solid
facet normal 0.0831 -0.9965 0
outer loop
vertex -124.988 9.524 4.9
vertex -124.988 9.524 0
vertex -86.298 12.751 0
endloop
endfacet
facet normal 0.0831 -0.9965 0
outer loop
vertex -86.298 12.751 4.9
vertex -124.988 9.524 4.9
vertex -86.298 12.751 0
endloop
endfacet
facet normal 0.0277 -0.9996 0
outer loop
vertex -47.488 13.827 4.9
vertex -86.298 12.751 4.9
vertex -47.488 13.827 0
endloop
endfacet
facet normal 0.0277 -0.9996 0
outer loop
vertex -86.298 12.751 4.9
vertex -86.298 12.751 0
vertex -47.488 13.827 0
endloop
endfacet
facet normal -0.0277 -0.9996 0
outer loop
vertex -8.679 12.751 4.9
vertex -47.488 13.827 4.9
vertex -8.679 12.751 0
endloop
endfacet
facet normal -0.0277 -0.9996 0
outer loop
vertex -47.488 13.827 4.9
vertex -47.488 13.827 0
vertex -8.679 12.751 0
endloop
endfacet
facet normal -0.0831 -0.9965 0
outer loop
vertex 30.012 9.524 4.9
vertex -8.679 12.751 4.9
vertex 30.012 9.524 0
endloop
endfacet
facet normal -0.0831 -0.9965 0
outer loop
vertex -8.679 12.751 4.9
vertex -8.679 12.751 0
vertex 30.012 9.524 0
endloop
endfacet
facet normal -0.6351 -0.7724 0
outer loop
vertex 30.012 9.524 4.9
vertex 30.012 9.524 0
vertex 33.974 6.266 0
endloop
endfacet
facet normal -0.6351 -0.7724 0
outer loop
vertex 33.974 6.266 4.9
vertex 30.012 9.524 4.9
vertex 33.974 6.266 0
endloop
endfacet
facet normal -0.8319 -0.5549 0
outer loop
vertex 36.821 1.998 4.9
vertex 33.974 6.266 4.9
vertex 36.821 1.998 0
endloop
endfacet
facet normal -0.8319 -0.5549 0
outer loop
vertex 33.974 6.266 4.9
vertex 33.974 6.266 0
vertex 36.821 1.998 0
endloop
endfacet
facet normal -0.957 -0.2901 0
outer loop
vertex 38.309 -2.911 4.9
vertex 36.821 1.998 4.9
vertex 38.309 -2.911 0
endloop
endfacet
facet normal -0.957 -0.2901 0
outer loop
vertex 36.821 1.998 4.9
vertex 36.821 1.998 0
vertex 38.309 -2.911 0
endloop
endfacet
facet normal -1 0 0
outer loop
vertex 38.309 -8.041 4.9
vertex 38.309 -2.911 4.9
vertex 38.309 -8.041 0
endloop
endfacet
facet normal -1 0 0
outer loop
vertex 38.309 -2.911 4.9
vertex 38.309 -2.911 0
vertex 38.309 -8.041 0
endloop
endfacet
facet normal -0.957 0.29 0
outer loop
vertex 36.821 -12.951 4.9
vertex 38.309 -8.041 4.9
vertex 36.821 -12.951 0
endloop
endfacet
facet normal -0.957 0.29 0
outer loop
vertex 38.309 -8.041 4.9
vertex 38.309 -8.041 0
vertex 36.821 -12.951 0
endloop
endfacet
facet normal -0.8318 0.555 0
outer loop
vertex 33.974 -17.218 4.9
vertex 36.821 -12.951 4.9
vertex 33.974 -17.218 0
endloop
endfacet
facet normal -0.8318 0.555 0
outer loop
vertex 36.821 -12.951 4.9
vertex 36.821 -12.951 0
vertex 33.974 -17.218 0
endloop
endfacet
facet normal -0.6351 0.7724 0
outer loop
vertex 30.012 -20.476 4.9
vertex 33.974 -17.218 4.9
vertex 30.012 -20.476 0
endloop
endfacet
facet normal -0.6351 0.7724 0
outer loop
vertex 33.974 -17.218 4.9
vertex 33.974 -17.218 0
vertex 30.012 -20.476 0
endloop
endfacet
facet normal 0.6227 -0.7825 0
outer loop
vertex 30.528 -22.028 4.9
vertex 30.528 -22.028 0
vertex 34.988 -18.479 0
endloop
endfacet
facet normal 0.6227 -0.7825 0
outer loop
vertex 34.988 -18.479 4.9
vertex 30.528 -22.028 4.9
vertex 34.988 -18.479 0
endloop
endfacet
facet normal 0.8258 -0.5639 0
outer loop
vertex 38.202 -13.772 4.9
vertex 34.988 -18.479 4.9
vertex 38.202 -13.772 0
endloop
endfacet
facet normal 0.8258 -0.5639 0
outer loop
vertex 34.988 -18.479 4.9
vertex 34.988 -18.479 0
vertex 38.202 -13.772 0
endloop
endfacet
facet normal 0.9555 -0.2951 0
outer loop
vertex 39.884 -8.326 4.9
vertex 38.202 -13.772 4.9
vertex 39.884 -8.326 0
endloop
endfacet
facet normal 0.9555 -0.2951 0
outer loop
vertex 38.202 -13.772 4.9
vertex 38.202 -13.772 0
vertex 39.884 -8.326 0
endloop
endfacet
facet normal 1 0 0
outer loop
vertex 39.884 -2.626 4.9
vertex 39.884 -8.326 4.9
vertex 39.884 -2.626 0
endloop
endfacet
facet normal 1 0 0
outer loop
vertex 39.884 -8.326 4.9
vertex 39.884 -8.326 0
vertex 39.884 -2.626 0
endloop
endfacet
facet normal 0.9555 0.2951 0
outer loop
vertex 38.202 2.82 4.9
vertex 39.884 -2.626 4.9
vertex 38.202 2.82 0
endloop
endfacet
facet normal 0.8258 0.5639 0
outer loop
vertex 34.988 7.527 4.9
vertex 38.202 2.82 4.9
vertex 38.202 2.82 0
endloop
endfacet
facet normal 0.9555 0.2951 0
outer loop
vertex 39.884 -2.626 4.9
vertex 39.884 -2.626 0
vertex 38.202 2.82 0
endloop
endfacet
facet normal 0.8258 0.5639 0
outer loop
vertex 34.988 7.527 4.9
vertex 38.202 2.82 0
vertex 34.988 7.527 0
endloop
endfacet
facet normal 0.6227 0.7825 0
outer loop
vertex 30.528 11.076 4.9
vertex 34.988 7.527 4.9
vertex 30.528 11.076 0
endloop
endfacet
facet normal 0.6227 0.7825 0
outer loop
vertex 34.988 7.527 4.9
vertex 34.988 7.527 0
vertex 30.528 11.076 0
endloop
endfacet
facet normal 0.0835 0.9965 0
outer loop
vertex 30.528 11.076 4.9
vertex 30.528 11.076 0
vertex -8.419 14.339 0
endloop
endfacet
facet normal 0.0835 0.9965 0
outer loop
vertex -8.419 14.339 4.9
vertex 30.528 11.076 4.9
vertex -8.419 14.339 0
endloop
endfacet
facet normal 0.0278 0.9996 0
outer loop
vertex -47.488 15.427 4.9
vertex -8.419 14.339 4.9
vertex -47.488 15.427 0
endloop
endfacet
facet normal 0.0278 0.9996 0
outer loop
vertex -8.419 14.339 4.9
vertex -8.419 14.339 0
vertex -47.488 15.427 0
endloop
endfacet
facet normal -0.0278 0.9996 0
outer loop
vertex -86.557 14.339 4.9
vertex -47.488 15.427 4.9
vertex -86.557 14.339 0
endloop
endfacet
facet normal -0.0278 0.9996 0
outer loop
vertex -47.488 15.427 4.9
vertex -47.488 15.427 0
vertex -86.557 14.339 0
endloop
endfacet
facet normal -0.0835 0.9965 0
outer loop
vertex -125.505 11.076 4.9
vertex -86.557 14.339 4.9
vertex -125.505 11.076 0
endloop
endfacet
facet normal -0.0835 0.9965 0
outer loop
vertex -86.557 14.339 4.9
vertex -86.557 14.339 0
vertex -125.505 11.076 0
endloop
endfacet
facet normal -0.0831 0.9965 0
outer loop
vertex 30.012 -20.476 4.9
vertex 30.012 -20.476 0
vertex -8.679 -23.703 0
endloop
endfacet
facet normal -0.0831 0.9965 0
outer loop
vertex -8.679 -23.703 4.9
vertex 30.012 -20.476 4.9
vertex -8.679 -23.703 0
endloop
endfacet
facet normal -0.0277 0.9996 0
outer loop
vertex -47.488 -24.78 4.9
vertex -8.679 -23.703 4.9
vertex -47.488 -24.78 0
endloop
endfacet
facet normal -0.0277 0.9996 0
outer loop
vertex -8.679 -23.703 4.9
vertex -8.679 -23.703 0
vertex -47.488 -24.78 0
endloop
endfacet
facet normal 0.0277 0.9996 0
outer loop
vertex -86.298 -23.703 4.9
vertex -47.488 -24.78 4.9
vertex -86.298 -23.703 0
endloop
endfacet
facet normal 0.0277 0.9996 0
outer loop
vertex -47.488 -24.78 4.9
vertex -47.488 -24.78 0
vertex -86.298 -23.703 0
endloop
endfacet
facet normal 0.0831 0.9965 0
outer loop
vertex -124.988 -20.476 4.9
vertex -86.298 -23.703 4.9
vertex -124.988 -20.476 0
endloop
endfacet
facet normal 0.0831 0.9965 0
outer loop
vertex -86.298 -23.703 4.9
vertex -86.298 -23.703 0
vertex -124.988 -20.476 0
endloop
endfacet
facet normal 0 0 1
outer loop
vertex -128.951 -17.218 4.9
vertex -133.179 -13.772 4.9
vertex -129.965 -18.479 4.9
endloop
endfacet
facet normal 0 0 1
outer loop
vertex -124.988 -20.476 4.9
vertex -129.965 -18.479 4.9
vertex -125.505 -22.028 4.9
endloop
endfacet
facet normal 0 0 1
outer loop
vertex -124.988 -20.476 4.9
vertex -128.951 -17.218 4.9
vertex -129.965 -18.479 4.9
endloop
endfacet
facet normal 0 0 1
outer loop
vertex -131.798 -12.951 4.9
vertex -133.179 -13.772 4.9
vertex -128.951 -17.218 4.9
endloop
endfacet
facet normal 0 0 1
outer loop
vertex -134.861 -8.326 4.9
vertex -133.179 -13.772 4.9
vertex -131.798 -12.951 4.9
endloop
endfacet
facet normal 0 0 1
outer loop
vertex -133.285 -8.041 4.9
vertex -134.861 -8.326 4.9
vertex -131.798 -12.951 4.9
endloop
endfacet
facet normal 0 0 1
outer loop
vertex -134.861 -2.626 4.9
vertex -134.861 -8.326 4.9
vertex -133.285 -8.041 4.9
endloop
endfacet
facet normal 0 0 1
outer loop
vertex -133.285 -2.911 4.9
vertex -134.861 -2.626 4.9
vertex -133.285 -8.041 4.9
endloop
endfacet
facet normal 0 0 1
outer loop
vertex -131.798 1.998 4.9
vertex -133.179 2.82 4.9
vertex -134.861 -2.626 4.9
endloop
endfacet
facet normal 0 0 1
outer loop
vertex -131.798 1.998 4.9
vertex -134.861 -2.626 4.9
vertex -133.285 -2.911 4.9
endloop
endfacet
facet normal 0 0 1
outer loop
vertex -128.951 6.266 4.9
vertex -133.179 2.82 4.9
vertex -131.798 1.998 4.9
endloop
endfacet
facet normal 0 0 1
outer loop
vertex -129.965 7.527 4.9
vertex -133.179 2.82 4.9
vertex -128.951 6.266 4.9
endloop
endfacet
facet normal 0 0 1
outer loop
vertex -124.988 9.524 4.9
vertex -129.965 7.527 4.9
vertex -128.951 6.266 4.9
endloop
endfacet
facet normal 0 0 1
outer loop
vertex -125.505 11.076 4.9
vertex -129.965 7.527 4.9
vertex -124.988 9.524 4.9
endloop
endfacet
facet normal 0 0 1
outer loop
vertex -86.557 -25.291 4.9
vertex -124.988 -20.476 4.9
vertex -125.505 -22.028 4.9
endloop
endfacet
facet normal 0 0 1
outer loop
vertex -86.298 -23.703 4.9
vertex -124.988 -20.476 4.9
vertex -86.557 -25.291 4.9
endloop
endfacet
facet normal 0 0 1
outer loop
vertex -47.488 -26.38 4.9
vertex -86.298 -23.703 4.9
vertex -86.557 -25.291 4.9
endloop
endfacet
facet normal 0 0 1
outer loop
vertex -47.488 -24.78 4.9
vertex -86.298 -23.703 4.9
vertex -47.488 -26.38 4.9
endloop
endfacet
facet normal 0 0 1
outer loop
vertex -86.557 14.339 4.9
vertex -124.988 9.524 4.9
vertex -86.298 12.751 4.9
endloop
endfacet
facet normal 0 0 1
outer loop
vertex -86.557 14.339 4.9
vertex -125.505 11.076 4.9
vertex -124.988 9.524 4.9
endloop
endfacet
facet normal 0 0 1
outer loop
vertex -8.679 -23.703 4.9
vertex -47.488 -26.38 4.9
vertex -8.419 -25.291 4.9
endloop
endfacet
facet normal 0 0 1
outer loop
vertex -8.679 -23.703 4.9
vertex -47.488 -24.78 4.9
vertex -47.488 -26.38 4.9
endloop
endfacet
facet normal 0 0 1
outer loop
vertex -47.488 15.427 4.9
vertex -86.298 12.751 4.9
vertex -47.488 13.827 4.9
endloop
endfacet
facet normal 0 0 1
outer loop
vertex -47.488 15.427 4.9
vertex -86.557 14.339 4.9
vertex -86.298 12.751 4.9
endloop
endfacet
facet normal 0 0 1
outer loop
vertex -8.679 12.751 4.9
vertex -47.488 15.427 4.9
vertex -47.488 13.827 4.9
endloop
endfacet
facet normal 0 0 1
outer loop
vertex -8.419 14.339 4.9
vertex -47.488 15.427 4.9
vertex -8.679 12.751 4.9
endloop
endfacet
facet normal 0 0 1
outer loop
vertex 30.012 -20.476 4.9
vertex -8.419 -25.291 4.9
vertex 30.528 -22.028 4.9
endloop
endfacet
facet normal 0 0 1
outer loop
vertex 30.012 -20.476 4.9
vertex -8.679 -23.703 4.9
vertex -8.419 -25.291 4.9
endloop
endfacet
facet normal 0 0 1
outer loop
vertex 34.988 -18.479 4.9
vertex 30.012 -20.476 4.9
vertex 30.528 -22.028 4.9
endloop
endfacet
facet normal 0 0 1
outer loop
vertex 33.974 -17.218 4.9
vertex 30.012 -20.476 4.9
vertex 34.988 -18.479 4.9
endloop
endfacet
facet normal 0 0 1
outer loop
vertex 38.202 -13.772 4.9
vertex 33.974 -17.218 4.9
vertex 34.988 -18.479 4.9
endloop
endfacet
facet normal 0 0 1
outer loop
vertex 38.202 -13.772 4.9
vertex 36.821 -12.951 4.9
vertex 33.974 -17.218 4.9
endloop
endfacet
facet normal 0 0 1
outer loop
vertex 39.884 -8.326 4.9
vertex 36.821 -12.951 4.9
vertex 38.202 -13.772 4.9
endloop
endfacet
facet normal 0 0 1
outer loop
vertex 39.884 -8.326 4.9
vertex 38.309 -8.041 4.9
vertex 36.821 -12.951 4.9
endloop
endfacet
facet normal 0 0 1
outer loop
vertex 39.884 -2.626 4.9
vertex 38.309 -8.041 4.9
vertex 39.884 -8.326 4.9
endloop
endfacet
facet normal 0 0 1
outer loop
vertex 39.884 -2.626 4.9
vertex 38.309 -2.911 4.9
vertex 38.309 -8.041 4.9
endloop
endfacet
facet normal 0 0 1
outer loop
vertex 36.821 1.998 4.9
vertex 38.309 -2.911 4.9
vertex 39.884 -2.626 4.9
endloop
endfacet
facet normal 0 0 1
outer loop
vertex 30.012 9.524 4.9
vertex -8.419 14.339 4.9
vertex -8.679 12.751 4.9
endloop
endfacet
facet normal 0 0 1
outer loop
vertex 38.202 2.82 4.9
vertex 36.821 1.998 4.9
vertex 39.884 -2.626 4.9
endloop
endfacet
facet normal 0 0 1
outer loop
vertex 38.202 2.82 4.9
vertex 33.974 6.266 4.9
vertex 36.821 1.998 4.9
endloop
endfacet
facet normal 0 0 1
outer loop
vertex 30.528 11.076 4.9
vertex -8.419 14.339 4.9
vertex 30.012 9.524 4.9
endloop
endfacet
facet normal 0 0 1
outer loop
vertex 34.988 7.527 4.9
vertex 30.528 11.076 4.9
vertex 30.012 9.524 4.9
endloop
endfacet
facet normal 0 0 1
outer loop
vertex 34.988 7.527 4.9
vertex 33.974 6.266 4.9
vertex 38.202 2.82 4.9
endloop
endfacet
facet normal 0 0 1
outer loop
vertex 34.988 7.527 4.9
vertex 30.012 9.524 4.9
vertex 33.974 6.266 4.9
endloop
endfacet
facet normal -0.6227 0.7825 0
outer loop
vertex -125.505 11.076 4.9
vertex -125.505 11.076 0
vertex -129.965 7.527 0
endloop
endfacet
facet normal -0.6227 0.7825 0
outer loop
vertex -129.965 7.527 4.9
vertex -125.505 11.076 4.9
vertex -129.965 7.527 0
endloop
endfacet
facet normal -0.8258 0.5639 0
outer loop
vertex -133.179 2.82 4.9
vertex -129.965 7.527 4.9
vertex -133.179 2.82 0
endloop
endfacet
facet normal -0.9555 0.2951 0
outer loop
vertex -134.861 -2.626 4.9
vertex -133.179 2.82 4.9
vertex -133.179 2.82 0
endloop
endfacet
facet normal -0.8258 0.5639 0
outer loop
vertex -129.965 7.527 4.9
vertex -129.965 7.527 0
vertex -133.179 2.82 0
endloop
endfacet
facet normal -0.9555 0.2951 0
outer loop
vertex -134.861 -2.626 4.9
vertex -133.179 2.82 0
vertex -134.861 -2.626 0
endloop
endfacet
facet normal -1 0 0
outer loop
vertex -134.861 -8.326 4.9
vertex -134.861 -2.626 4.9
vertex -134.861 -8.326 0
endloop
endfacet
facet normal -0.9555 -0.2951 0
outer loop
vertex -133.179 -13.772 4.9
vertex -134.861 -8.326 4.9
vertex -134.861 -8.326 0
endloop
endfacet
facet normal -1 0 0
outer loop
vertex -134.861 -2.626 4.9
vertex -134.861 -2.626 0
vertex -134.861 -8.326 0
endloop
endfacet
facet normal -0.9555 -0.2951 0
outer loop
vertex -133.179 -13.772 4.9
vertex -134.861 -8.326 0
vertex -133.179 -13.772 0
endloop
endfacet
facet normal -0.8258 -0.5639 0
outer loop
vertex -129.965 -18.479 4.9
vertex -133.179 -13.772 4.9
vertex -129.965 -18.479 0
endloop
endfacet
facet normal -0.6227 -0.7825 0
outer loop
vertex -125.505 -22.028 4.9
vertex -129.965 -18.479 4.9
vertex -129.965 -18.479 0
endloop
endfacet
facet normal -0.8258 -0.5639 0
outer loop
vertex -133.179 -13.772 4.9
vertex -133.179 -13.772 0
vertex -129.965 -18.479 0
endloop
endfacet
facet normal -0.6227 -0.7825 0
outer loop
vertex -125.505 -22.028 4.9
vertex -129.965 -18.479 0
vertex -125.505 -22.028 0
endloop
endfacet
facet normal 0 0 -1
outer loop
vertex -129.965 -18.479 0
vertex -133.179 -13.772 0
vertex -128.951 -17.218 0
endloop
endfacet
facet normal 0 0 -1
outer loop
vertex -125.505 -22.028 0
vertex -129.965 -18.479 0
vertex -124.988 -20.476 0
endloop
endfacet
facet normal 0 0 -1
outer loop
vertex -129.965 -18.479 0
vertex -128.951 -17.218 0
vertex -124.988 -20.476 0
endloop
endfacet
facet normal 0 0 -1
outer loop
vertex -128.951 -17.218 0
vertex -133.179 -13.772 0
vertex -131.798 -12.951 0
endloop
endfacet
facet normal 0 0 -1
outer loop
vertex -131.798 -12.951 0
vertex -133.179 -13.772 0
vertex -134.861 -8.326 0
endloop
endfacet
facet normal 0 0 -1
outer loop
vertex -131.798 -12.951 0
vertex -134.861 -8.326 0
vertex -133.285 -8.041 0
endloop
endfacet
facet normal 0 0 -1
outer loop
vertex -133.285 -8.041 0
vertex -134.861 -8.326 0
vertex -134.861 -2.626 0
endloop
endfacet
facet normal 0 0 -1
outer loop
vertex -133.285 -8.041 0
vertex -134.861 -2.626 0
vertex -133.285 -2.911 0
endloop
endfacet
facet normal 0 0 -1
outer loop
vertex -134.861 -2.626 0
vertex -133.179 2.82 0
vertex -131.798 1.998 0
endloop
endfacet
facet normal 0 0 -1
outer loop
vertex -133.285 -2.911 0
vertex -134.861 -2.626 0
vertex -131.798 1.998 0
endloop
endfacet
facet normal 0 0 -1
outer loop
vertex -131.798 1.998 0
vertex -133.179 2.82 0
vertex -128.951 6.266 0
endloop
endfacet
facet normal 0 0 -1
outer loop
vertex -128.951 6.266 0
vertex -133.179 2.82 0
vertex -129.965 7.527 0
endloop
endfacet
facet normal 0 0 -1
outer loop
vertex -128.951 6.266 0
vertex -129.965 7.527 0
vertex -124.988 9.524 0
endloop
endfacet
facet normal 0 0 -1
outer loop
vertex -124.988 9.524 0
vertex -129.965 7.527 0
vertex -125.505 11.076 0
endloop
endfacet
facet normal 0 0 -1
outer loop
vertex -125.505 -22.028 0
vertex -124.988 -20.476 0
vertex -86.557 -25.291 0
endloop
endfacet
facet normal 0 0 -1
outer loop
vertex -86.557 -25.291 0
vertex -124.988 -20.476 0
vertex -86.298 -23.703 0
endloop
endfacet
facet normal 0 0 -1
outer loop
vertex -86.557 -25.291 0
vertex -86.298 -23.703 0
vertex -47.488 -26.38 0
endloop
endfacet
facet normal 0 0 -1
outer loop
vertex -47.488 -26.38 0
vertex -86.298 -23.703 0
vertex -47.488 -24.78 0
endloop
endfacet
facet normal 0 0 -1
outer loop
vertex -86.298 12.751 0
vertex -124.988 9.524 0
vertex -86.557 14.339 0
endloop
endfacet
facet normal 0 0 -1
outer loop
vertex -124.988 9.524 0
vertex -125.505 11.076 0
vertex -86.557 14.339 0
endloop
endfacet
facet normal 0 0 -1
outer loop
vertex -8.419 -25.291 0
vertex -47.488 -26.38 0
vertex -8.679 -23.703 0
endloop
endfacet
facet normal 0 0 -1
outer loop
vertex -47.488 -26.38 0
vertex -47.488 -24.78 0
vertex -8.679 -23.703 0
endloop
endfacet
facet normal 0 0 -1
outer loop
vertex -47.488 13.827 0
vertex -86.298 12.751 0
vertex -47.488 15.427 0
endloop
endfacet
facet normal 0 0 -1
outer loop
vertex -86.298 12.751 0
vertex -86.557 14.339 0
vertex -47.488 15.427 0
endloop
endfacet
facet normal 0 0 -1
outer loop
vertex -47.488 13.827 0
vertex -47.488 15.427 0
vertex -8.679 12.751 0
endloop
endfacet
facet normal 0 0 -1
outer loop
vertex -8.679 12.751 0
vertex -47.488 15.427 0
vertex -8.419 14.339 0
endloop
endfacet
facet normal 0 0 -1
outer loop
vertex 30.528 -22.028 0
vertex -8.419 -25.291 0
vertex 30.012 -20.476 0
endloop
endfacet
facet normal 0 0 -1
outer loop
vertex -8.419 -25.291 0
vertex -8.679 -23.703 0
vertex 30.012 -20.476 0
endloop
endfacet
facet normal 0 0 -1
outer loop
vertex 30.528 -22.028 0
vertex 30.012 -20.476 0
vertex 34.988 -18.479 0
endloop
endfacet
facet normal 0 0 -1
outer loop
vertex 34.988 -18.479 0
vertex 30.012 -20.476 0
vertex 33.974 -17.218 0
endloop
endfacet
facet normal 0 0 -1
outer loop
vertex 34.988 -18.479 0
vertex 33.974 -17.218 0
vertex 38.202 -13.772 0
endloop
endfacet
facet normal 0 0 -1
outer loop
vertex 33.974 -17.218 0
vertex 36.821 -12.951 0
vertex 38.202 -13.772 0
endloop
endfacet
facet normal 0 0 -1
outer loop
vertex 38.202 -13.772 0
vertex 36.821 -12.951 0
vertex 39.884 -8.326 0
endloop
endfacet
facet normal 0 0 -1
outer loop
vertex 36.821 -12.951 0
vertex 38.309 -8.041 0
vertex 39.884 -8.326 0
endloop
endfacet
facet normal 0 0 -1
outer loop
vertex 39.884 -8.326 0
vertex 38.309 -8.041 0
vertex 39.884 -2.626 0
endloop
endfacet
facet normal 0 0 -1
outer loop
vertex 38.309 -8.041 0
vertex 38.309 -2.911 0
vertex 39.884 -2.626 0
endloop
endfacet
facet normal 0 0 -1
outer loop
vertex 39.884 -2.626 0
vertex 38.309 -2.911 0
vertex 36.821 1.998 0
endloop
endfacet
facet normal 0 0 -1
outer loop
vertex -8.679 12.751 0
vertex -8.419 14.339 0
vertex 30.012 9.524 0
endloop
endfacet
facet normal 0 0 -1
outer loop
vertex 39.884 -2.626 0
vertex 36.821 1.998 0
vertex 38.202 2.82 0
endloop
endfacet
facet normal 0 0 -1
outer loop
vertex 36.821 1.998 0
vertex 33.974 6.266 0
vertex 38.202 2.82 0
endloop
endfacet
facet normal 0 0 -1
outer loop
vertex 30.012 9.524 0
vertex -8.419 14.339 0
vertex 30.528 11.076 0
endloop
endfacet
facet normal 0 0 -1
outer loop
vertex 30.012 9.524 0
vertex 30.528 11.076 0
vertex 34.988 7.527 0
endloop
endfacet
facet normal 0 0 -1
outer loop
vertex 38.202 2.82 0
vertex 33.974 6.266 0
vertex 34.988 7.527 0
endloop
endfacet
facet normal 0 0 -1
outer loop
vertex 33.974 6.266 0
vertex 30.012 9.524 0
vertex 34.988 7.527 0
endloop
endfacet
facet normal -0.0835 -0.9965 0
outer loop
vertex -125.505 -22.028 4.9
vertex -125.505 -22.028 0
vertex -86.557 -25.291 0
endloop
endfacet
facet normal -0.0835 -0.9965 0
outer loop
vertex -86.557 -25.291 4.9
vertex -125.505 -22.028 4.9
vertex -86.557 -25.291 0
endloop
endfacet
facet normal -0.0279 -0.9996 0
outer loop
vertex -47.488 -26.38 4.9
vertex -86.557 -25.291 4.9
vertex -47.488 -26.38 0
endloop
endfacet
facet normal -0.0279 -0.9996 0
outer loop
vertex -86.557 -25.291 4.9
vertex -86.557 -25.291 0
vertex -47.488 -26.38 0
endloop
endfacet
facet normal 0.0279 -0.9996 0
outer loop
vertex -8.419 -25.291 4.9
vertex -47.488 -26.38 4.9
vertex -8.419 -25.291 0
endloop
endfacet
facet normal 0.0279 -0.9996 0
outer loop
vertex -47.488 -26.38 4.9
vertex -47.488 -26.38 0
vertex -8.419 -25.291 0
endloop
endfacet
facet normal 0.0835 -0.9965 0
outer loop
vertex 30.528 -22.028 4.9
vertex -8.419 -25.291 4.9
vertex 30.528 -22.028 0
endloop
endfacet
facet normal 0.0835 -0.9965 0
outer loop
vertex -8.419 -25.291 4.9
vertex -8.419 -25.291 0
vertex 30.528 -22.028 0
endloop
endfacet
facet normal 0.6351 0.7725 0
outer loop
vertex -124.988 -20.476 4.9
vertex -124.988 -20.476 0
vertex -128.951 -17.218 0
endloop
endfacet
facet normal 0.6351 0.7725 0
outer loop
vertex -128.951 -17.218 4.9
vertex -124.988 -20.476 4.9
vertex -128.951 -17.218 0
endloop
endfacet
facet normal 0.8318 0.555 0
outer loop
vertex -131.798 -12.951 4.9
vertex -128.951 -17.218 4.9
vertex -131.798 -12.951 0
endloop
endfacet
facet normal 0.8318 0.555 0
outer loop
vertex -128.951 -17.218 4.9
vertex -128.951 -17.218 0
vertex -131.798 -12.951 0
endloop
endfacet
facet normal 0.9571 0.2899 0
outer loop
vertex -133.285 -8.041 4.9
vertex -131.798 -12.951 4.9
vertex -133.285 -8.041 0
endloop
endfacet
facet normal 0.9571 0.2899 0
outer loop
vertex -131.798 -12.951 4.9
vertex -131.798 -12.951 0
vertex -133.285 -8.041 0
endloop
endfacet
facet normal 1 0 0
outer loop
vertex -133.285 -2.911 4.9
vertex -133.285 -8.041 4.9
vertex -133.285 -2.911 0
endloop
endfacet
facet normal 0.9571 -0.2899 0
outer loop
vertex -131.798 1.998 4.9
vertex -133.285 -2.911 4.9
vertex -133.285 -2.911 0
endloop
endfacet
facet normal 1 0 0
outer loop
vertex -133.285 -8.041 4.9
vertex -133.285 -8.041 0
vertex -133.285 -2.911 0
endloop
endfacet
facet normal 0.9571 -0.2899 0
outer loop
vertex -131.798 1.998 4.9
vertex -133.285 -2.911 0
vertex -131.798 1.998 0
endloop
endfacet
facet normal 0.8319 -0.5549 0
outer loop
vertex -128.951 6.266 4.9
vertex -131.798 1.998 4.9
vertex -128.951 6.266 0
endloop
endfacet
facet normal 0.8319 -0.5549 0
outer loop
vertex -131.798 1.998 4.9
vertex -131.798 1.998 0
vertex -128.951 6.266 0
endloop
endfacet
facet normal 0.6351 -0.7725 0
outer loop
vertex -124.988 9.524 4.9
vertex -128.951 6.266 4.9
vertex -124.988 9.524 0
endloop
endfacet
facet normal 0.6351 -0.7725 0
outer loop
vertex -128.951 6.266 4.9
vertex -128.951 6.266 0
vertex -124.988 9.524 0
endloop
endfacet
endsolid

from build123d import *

# Parameters (mm, degrees)
F1_DEPTH = 4.9


with BuildPart() as f1:
    # F0 (on Top) → F1 (new body)
    with BuildSketch(Plane.XY):
        with BuildLine():
            ThreePointArc((30.528466, -22.028455), (40.097824, -5.476208), (30.528466, 11.076038))
            ThreePointArc((30.528466, 11.076038), (-47.488298, 15.427198), (-125.505062, 11.076038))
            ThreePointArc((-125.505062, 11.076038), (-135.07442, -5.476208), (-125.505062, -22.028455))
            ThreePointArc((-125.505062, -22.028455), (-47.488298, -26.379615), (30.528466, -22.028455))
        make_face()
        with BuildLine():
            ThreePointArc((-124.988298, -20.476208), (-133.47442, -5.476208), (-124.988298, 9.523792))
            ThreePointArc((-124.988298, 9.523792), (-47.488298, 13.827198), (30.011702, 9.523792))
            ThreePointArc((30.011702, 9.523792), (38.497824, -5.476208), (30.011702, -20.476208))
            ThreePointArc((30.011702, -20.476208), (-47.488298, -24.779615), (-124.988298, -20.476208))
        make_face(mode=Mode.SUBTRACT)
    extrude(amount=F1_DEPTH)


solid = f1.part
